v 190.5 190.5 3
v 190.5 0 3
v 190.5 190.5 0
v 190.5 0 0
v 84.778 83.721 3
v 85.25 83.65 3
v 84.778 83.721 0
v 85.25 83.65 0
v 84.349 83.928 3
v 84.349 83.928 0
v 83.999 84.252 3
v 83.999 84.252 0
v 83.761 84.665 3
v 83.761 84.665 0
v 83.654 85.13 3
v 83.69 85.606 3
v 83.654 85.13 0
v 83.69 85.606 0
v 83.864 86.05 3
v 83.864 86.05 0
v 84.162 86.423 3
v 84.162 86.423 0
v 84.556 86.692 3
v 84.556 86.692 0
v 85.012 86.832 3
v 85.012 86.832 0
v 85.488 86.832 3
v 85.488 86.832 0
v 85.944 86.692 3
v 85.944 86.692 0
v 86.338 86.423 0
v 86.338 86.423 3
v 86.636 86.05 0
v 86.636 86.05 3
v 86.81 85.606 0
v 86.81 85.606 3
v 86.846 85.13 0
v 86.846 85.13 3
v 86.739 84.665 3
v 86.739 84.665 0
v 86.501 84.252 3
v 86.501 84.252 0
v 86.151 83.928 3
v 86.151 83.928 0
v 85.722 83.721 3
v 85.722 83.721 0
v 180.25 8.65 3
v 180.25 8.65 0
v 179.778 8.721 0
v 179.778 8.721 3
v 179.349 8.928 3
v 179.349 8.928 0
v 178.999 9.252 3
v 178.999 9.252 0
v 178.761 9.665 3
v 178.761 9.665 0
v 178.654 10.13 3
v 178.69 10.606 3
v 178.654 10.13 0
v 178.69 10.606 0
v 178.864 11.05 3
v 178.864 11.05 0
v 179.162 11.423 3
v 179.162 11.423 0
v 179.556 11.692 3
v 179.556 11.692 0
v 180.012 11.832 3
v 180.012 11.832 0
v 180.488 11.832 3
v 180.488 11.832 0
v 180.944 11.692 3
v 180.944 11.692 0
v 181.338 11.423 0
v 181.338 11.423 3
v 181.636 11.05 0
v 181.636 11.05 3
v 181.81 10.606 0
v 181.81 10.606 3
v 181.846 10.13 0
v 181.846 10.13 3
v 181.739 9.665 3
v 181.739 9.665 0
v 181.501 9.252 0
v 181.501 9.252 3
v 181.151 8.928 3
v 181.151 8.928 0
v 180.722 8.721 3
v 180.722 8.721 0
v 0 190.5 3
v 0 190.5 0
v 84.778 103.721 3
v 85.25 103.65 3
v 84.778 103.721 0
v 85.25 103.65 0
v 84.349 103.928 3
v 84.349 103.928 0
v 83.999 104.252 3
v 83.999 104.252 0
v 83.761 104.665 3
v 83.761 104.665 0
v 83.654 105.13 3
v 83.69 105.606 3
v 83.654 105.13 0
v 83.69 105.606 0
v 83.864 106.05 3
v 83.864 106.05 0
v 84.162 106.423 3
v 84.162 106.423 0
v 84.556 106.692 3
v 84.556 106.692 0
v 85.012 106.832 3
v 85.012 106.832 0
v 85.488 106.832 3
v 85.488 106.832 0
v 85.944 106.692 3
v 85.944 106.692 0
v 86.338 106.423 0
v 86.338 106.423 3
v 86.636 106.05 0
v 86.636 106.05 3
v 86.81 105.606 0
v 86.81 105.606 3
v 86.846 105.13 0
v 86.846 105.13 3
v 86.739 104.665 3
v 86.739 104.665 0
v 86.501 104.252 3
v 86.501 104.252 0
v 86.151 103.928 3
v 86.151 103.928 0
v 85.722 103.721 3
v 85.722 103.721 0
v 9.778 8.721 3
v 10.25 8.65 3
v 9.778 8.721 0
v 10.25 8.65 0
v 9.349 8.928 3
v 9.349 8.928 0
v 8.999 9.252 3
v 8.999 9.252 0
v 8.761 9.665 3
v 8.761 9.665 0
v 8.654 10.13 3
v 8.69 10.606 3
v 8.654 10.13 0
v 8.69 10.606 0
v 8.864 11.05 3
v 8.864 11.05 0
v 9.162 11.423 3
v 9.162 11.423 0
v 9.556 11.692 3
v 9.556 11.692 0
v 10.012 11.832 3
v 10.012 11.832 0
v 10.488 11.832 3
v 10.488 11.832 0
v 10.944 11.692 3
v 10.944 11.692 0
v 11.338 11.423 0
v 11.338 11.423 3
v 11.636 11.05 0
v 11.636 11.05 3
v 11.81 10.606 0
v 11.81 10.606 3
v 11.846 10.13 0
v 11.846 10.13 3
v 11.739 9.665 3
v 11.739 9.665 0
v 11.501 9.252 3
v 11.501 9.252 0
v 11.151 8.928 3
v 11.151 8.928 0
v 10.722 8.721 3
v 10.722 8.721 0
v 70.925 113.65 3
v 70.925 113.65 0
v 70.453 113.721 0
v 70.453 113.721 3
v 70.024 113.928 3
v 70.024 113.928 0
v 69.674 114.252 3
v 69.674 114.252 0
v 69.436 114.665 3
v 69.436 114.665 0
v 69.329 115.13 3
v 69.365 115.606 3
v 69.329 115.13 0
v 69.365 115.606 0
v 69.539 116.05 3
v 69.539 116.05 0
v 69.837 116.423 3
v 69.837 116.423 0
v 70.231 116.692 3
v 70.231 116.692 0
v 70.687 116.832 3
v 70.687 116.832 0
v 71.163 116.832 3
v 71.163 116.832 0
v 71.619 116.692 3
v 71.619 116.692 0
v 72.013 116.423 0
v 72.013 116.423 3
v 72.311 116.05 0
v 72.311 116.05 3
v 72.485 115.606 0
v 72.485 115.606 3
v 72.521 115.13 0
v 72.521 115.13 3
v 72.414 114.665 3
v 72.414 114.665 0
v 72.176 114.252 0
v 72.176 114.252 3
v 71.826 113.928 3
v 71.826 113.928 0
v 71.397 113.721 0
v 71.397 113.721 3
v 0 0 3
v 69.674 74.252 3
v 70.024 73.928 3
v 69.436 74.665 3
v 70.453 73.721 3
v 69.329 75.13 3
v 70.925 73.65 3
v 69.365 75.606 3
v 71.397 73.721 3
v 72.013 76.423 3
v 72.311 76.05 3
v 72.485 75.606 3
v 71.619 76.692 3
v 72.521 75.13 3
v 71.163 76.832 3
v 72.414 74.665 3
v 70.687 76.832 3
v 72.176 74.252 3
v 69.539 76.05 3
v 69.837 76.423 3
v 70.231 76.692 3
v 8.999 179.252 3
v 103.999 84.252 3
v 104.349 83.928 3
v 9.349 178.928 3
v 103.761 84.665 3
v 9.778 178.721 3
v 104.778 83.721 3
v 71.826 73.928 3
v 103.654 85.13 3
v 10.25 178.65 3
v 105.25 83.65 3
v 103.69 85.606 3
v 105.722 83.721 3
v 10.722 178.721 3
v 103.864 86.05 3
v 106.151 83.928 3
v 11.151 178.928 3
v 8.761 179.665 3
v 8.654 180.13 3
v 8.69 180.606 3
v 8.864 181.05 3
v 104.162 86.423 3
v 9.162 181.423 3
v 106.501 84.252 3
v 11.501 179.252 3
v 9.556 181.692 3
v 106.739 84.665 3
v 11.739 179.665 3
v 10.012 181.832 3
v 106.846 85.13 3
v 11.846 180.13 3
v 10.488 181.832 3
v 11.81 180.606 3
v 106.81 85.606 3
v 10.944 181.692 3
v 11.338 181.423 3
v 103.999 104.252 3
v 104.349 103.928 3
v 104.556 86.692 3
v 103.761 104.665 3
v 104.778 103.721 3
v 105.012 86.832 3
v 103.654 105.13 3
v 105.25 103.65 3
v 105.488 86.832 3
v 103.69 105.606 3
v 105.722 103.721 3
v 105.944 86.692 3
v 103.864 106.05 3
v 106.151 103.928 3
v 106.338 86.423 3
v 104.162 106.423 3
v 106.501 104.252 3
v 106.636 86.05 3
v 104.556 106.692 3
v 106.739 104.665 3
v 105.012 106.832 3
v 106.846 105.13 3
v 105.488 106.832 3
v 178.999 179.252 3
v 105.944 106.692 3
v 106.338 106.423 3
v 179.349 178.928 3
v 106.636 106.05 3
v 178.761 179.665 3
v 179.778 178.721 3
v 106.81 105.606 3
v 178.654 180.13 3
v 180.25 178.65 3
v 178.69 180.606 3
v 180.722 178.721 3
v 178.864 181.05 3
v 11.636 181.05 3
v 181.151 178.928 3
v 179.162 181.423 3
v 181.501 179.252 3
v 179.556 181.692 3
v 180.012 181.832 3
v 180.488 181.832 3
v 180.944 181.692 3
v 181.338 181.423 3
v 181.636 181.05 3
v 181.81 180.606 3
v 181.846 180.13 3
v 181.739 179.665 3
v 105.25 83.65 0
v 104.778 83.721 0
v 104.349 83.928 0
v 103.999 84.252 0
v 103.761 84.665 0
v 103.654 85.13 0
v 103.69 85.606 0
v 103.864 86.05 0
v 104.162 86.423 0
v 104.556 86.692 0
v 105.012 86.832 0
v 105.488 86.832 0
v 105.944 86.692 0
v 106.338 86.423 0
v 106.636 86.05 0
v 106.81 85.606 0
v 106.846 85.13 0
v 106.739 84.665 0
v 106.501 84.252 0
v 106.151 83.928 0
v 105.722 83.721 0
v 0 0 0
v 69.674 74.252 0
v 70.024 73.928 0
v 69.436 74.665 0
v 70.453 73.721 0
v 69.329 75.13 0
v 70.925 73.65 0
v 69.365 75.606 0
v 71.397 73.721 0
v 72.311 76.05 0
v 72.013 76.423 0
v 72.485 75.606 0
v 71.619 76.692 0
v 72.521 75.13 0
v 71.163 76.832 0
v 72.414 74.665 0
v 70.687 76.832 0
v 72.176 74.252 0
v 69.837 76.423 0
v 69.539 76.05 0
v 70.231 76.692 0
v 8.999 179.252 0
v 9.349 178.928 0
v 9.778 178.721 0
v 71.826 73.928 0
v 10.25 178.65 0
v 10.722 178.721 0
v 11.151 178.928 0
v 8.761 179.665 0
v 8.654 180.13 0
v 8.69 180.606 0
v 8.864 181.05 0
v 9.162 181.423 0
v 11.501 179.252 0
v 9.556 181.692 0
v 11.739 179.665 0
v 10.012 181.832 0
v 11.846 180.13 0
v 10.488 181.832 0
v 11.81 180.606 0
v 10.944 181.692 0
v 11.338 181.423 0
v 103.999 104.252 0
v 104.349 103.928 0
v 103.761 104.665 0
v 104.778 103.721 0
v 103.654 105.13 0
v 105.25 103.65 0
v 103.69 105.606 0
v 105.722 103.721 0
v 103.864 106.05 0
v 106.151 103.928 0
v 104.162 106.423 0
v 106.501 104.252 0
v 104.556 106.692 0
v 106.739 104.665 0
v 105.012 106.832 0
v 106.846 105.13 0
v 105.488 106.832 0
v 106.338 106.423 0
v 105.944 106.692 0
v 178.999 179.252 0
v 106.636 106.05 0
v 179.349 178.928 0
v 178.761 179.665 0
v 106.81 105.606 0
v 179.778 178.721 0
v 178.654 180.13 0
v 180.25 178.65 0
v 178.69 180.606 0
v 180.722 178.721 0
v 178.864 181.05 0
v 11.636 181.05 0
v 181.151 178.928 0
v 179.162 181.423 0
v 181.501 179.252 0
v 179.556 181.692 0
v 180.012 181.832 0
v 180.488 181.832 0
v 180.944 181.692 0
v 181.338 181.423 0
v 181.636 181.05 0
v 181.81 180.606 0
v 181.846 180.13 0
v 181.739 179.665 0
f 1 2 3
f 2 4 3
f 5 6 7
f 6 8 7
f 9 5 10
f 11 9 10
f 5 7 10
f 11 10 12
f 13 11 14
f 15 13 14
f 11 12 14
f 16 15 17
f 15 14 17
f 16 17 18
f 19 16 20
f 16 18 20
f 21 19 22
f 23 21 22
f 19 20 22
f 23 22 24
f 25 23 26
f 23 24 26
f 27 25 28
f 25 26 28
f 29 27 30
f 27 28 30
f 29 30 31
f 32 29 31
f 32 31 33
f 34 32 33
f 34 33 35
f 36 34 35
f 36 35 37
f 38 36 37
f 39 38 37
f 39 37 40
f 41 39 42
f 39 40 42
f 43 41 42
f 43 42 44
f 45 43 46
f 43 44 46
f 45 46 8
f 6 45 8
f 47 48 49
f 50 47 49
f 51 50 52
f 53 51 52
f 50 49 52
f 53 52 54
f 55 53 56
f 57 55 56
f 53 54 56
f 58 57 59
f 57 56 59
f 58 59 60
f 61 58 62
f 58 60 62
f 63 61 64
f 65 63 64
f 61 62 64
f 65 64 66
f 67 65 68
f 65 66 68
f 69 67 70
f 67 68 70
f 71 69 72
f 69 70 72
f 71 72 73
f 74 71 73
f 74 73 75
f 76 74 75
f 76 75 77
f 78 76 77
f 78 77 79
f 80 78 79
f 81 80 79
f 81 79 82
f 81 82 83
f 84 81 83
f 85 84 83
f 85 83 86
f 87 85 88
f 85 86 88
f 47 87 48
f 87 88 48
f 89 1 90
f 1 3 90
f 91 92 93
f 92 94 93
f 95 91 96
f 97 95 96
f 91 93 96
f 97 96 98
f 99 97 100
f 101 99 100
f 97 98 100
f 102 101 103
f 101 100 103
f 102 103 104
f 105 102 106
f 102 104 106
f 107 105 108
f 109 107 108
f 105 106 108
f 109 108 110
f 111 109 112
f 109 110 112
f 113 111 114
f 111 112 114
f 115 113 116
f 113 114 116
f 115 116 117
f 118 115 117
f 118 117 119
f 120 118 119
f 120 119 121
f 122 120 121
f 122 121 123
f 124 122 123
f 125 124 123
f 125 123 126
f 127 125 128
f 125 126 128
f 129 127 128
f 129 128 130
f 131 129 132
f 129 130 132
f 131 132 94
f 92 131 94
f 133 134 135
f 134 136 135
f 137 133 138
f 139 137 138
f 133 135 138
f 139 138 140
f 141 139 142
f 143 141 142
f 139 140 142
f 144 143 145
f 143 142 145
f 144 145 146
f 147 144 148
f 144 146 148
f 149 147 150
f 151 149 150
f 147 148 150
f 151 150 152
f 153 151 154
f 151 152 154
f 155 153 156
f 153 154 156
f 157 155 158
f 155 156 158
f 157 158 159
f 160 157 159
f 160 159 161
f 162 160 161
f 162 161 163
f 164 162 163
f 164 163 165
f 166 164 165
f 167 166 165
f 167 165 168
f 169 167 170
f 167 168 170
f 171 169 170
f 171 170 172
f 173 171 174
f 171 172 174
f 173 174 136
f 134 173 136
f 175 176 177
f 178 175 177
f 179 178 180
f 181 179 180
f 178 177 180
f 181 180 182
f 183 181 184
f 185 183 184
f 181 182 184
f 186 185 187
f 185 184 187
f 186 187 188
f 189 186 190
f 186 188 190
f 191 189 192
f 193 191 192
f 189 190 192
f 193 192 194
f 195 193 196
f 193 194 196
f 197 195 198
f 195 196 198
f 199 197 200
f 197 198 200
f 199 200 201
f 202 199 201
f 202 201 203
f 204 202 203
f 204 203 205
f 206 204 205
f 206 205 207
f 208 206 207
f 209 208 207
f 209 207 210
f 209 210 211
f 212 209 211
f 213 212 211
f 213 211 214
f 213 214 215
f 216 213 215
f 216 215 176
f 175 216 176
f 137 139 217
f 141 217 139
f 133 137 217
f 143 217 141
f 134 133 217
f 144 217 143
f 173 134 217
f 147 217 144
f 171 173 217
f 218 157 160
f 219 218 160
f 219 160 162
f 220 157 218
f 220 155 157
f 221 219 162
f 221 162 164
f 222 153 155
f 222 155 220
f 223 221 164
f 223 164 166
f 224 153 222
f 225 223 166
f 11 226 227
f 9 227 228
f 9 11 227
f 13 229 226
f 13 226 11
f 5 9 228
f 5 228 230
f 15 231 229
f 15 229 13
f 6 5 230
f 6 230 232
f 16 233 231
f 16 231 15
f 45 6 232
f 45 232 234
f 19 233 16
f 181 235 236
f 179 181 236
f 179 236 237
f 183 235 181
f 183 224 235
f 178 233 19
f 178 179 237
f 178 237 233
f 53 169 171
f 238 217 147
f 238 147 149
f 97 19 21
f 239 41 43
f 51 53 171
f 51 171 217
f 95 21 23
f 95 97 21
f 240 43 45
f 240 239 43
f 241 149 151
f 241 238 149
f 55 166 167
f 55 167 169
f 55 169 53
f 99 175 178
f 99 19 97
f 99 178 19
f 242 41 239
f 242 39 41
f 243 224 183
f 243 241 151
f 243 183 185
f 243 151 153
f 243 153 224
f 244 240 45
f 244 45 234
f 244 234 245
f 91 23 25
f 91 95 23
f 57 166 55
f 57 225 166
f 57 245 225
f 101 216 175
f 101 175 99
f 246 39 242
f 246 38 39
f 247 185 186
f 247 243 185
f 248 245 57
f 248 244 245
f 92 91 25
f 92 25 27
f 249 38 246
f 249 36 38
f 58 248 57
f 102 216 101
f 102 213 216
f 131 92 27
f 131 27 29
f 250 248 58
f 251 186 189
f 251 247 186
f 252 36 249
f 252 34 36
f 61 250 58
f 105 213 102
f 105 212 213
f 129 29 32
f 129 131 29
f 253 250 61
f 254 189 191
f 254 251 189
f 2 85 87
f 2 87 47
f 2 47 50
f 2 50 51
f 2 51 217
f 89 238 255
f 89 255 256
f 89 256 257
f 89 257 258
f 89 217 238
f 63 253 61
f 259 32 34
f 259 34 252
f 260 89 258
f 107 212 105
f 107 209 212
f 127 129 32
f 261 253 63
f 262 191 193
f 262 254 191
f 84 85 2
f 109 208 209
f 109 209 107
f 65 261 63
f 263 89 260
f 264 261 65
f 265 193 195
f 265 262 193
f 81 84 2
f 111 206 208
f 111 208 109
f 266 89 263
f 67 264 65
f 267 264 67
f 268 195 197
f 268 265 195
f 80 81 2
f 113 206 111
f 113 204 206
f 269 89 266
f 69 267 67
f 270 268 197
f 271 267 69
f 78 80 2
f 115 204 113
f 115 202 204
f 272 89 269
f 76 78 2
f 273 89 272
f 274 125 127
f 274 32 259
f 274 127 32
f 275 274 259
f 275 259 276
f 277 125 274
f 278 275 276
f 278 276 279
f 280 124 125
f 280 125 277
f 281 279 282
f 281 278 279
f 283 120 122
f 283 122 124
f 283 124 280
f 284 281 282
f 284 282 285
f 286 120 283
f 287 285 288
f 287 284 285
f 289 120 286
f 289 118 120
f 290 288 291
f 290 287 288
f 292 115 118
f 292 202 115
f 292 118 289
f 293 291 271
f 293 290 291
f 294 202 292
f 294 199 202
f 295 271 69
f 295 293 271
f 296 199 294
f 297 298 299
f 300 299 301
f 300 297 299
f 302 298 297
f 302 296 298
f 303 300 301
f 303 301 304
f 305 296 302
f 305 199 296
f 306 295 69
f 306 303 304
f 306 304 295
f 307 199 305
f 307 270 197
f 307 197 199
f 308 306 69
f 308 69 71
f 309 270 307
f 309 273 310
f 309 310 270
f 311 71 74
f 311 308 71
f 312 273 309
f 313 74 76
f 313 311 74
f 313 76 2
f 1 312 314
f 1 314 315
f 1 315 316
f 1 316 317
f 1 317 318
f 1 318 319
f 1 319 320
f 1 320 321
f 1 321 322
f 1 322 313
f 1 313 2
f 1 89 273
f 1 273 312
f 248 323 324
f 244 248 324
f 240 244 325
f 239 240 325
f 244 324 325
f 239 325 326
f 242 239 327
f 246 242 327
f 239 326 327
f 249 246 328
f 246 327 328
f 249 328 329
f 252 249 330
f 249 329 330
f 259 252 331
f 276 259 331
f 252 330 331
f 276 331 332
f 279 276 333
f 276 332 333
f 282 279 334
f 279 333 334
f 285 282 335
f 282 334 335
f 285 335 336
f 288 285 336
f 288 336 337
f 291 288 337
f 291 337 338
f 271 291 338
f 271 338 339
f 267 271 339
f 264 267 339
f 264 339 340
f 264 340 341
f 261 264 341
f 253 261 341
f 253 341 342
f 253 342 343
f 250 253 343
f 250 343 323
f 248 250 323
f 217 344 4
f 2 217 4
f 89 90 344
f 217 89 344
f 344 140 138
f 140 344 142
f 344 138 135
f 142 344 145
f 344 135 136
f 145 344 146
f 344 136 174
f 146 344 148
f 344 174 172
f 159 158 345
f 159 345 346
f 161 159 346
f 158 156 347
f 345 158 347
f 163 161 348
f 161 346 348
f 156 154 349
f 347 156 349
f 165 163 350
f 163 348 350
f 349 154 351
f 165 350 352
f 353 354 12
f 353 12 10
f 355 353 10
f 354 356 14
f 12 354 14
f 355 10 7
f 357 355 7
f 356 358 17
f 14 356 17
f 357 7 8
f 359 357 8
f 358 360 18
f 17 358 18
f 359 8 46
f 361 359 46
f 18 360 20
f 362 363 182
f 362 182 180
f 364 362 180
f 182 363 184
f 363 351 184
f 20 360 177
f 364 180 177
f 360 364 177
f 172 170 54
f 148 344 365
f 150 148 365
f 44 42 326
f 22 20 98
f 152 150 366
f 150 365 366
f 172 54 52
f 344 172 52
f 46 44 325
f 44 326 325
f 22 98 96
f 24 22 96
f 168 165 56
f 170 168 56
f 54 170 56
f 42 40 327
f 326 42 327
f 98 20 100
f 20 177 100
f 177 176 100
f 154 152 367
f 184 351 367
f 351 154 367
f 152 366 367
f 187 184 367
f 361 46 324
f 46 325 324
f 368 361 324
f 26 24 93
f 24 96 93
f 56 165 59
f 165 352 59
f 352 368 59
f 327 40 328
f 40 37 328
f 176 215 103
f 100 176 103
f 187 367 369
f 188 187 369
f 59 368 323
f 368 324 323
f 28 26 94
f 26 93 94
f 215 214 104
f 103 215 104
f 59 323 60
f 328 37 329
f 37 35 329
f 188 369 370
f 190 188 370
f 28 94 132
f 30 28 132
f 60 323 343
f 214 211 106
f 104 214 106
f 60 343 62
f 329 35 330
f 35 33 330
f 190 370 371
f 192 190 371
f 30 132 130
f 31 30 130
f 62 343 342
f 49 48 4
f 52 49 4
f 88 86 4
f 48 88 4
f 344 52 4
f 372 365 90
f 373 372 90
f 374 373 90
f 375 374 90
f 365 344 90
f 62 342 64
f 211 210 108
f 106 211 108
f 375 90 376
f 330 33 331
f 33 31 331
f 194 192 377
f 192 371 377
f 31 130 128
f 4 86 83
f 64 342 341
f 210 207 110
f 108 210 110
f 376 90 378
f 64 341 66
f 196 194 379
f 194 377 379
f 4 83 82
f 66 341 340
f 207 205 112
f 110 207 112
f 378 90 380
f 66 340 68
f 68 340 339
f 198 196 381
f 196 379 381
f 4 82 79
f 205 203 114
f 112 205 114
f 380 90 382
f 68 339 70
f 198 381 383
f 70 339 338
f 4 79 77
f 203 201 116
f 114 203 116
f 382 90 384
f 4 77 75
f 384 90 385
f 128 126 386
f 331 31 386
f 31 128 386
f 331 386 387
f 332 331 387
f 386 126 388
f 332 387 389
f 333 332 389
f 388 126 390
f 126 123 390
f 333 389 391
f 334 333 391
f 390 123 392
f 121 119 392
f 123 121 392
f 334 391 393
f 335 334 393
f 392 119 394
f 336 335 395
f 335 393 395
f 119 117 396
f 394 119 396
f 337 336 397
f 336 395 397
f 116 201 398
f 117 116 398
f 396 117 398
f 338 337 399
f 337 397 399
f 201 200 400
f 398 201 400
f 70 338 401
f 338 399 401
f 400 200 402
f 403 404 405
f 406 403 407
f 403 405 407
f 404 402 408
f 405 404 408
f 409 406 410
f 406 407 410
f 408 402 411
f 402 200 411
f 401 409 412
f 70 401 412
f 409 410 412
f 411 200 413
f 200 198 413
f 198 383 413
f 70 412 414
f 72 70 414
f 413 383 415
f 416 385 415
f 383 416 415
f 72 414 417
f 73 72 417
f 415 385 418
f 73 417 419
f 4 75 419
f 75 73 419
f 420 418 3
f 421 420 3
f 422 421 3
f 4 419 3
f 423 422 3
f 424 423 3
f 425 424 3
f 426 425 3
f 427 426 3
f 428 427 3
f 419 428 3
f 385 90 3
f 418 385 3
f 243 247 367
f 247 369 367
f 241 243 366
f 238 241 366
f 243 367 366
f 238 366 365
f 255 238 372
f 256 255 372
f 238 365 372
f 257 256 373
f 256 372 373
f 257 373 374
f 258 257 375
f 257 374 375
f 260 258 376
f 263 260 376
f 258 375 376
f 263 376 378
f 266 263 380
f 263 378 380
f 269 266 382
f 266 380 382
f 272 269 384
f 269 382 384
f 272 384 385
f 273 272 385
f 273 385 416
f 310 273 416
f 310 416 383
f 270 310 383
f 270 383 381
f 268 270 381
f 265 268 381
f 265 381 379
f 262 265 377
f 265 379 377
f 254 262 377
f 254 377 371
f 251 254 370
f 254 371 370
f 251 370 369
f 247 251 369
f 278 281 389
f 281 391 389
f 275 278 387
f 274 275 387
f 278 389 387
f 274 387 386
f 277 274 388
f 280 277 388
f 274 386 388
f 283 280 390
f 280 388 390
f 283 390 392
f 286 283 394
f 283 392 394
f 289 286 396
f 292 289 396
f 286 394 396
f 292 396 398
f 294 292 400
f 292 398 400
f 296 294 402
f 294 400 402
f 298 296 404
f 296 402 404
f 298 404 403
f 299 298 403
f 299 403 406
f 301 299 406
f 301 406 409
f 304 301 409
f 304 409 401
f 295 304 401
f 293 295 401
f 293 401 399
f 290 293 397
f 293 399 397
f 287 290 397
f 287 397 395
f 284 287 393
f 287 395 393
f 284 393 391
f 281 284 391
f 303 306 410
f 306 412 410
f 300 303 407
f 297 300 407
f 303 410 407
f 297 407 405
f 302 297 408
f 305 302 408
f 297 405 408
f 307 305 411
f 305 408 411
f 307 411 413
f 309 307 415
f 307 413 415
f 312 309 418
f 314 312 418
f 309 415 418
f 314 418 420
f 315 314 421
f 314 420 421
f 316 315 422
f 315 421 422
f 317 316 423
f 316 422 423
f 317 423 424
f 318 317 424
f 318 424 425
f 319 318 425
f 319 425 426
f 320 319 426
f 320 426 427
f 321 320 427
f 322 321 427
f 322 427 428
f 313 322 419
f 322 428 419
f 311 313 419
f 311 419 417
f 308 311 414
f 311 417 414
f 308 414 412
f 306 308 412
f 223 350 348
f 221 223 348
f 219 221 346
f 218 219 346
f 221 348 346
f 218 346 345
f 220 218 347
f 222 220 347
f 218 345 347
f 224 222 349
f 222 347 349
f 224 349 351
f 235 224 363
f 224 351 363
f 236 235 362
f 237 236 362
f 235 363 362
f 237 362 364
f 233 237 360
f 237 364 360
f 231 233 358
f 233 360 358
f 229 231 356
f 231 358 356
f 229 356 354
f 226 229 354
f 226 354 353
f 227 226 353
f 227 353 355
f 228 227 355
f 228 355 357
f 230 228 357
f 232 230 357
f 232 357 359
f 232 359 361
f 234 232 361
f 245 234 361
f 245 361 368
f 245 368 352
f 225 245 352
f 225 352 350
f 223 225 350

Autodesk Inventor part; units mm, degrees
ref_plane "YZ Plane" through (0, 0, 0) normal (1, 0, 0) x (0, 1, 0)
ref_plane "XZ Plane" through (0, 0, 0) normal (0, 1, 0) x (-1, 0, 0)
ref_plane "XY Plane" through (0, 0, 0) normal (0, 0, 1) x (1, 0, 0)
sketch "Sketch1" plane through (0, 0, 0) normal (0, 0, 1) x (1, 0, 0)
  line L0 (0, 0) -> (190.5, 0)
  line L1 (190.5, 0) -> (190.5, 190.5)
  line L2 (190.5, 190.5) -> (0, 190.5)
  line L3 (0, 190.5) -> (0, 0)
  dimension "d0" = 190.5
  dimension "d1" = 190.5
extrude "Extrusion1" add sketch "Sketch1" along normal blind 3
ref_plane "Work Plane1" through (0, 95.25, 0) normal (0, 1, 0) x (1, 0, 0)
sketch "Sketch2" plane through (0, 0, 3) normal (0, 0, 1) x (1, 0, 0)
  line L0 (0, 190.5) -> (0, 0) projected
  line L1 (190.5, 0) -> (190.5, 190.5) projected
  line L2 (0, 0) -> (190.5, 0) projected
  line L3 (190.5, 190.5) -> (0, 190.5) projected
  line L4 (32.6, 104.25) -> (56.6, 104.25) construction
  line L5 (133.9, 104.25) -> (157.9, 104.25) construction
  line L6 (85.25, 105.25) -> (105.25, 105.25) construction
  line L7 (105.25, 105.25) -> (105.25, 85.25) construction
  line L8 (105.25, 85.25) -> (85.25, 85.25) construction
  line L9 (85.25, 85.25) -> (85.25, 105.25) construction
  line L10 (70.925, 115.25) -> (70.925, 75.25) construction
  point P0 (10.25, 180.25)
  point P1 (180.25, 180.25)
  point P2 (180.25, 10.25)
  point P3 (10.25, 10.25)
  point P4 (32.6, 86.25)
  point P5 (56.6, 86.25)
  point P6 (133.9, 86.25)
  point P7 (157.9, 86.25)
  point P8 (44.6, 104.25)
  point P9 (145.9, 104.25)
  point P10 (95.25, 105.25)
  point P11 (95.25, 190.5)
  point P12 (105.25, 95.25)
  point P13 (190.5, 95.25)
  point P14 (70.925, 95.25)
  point P15 (0, 95.25)
  dimension "d4" = 170
  dimension "d5" = 170
  dimension "d6" = 10.25
  dimension "d7" = 10.25
  dimension "d8" = 10.25
  dimension "d9" = 10.25
  dimension "d17" = 24
  dimension "d18" = 18
  dimension "d19" = 18
  dimension "d20" = 24
  dimension "d21" = 101.3
  dimension "d22" = 32.6
  dimension "d23" = 32.6
  dimension "d24" = 86.25
  dimension "d25" = 86.25
  dimension "d33" = 20
  dimension "d34" = 40
  dimension "d35" = 14.325
  dimension "d36" = 14.325
hole "Hole1" at (10.25, 180.25, 3) at (180.25, 180.25, 3) at (180.25, 10.25, 3) at (10.25, 10.25, 3) at (85.25, 105.25, 3) at (105.25, 105.25, 3) at (105.25, 85.25, 3) at (85.25, 85.25, 3) at (70.925, 115.25, 3) at (70.925, 75.25, 3) direction (0, 0, -1) diameter 3.2 end through all
equation "\"d5\" = d4"
equation "\"d6\" = d7"
equation "\"d8\" = d9"
equation "\"d19\" = d18"
equation "\"d20\" = d17"
equation "\"d22\" = d23"
equation "\"d24\" = d25"
equation "\"d35\" = d36"
properties part number "print bed base"
